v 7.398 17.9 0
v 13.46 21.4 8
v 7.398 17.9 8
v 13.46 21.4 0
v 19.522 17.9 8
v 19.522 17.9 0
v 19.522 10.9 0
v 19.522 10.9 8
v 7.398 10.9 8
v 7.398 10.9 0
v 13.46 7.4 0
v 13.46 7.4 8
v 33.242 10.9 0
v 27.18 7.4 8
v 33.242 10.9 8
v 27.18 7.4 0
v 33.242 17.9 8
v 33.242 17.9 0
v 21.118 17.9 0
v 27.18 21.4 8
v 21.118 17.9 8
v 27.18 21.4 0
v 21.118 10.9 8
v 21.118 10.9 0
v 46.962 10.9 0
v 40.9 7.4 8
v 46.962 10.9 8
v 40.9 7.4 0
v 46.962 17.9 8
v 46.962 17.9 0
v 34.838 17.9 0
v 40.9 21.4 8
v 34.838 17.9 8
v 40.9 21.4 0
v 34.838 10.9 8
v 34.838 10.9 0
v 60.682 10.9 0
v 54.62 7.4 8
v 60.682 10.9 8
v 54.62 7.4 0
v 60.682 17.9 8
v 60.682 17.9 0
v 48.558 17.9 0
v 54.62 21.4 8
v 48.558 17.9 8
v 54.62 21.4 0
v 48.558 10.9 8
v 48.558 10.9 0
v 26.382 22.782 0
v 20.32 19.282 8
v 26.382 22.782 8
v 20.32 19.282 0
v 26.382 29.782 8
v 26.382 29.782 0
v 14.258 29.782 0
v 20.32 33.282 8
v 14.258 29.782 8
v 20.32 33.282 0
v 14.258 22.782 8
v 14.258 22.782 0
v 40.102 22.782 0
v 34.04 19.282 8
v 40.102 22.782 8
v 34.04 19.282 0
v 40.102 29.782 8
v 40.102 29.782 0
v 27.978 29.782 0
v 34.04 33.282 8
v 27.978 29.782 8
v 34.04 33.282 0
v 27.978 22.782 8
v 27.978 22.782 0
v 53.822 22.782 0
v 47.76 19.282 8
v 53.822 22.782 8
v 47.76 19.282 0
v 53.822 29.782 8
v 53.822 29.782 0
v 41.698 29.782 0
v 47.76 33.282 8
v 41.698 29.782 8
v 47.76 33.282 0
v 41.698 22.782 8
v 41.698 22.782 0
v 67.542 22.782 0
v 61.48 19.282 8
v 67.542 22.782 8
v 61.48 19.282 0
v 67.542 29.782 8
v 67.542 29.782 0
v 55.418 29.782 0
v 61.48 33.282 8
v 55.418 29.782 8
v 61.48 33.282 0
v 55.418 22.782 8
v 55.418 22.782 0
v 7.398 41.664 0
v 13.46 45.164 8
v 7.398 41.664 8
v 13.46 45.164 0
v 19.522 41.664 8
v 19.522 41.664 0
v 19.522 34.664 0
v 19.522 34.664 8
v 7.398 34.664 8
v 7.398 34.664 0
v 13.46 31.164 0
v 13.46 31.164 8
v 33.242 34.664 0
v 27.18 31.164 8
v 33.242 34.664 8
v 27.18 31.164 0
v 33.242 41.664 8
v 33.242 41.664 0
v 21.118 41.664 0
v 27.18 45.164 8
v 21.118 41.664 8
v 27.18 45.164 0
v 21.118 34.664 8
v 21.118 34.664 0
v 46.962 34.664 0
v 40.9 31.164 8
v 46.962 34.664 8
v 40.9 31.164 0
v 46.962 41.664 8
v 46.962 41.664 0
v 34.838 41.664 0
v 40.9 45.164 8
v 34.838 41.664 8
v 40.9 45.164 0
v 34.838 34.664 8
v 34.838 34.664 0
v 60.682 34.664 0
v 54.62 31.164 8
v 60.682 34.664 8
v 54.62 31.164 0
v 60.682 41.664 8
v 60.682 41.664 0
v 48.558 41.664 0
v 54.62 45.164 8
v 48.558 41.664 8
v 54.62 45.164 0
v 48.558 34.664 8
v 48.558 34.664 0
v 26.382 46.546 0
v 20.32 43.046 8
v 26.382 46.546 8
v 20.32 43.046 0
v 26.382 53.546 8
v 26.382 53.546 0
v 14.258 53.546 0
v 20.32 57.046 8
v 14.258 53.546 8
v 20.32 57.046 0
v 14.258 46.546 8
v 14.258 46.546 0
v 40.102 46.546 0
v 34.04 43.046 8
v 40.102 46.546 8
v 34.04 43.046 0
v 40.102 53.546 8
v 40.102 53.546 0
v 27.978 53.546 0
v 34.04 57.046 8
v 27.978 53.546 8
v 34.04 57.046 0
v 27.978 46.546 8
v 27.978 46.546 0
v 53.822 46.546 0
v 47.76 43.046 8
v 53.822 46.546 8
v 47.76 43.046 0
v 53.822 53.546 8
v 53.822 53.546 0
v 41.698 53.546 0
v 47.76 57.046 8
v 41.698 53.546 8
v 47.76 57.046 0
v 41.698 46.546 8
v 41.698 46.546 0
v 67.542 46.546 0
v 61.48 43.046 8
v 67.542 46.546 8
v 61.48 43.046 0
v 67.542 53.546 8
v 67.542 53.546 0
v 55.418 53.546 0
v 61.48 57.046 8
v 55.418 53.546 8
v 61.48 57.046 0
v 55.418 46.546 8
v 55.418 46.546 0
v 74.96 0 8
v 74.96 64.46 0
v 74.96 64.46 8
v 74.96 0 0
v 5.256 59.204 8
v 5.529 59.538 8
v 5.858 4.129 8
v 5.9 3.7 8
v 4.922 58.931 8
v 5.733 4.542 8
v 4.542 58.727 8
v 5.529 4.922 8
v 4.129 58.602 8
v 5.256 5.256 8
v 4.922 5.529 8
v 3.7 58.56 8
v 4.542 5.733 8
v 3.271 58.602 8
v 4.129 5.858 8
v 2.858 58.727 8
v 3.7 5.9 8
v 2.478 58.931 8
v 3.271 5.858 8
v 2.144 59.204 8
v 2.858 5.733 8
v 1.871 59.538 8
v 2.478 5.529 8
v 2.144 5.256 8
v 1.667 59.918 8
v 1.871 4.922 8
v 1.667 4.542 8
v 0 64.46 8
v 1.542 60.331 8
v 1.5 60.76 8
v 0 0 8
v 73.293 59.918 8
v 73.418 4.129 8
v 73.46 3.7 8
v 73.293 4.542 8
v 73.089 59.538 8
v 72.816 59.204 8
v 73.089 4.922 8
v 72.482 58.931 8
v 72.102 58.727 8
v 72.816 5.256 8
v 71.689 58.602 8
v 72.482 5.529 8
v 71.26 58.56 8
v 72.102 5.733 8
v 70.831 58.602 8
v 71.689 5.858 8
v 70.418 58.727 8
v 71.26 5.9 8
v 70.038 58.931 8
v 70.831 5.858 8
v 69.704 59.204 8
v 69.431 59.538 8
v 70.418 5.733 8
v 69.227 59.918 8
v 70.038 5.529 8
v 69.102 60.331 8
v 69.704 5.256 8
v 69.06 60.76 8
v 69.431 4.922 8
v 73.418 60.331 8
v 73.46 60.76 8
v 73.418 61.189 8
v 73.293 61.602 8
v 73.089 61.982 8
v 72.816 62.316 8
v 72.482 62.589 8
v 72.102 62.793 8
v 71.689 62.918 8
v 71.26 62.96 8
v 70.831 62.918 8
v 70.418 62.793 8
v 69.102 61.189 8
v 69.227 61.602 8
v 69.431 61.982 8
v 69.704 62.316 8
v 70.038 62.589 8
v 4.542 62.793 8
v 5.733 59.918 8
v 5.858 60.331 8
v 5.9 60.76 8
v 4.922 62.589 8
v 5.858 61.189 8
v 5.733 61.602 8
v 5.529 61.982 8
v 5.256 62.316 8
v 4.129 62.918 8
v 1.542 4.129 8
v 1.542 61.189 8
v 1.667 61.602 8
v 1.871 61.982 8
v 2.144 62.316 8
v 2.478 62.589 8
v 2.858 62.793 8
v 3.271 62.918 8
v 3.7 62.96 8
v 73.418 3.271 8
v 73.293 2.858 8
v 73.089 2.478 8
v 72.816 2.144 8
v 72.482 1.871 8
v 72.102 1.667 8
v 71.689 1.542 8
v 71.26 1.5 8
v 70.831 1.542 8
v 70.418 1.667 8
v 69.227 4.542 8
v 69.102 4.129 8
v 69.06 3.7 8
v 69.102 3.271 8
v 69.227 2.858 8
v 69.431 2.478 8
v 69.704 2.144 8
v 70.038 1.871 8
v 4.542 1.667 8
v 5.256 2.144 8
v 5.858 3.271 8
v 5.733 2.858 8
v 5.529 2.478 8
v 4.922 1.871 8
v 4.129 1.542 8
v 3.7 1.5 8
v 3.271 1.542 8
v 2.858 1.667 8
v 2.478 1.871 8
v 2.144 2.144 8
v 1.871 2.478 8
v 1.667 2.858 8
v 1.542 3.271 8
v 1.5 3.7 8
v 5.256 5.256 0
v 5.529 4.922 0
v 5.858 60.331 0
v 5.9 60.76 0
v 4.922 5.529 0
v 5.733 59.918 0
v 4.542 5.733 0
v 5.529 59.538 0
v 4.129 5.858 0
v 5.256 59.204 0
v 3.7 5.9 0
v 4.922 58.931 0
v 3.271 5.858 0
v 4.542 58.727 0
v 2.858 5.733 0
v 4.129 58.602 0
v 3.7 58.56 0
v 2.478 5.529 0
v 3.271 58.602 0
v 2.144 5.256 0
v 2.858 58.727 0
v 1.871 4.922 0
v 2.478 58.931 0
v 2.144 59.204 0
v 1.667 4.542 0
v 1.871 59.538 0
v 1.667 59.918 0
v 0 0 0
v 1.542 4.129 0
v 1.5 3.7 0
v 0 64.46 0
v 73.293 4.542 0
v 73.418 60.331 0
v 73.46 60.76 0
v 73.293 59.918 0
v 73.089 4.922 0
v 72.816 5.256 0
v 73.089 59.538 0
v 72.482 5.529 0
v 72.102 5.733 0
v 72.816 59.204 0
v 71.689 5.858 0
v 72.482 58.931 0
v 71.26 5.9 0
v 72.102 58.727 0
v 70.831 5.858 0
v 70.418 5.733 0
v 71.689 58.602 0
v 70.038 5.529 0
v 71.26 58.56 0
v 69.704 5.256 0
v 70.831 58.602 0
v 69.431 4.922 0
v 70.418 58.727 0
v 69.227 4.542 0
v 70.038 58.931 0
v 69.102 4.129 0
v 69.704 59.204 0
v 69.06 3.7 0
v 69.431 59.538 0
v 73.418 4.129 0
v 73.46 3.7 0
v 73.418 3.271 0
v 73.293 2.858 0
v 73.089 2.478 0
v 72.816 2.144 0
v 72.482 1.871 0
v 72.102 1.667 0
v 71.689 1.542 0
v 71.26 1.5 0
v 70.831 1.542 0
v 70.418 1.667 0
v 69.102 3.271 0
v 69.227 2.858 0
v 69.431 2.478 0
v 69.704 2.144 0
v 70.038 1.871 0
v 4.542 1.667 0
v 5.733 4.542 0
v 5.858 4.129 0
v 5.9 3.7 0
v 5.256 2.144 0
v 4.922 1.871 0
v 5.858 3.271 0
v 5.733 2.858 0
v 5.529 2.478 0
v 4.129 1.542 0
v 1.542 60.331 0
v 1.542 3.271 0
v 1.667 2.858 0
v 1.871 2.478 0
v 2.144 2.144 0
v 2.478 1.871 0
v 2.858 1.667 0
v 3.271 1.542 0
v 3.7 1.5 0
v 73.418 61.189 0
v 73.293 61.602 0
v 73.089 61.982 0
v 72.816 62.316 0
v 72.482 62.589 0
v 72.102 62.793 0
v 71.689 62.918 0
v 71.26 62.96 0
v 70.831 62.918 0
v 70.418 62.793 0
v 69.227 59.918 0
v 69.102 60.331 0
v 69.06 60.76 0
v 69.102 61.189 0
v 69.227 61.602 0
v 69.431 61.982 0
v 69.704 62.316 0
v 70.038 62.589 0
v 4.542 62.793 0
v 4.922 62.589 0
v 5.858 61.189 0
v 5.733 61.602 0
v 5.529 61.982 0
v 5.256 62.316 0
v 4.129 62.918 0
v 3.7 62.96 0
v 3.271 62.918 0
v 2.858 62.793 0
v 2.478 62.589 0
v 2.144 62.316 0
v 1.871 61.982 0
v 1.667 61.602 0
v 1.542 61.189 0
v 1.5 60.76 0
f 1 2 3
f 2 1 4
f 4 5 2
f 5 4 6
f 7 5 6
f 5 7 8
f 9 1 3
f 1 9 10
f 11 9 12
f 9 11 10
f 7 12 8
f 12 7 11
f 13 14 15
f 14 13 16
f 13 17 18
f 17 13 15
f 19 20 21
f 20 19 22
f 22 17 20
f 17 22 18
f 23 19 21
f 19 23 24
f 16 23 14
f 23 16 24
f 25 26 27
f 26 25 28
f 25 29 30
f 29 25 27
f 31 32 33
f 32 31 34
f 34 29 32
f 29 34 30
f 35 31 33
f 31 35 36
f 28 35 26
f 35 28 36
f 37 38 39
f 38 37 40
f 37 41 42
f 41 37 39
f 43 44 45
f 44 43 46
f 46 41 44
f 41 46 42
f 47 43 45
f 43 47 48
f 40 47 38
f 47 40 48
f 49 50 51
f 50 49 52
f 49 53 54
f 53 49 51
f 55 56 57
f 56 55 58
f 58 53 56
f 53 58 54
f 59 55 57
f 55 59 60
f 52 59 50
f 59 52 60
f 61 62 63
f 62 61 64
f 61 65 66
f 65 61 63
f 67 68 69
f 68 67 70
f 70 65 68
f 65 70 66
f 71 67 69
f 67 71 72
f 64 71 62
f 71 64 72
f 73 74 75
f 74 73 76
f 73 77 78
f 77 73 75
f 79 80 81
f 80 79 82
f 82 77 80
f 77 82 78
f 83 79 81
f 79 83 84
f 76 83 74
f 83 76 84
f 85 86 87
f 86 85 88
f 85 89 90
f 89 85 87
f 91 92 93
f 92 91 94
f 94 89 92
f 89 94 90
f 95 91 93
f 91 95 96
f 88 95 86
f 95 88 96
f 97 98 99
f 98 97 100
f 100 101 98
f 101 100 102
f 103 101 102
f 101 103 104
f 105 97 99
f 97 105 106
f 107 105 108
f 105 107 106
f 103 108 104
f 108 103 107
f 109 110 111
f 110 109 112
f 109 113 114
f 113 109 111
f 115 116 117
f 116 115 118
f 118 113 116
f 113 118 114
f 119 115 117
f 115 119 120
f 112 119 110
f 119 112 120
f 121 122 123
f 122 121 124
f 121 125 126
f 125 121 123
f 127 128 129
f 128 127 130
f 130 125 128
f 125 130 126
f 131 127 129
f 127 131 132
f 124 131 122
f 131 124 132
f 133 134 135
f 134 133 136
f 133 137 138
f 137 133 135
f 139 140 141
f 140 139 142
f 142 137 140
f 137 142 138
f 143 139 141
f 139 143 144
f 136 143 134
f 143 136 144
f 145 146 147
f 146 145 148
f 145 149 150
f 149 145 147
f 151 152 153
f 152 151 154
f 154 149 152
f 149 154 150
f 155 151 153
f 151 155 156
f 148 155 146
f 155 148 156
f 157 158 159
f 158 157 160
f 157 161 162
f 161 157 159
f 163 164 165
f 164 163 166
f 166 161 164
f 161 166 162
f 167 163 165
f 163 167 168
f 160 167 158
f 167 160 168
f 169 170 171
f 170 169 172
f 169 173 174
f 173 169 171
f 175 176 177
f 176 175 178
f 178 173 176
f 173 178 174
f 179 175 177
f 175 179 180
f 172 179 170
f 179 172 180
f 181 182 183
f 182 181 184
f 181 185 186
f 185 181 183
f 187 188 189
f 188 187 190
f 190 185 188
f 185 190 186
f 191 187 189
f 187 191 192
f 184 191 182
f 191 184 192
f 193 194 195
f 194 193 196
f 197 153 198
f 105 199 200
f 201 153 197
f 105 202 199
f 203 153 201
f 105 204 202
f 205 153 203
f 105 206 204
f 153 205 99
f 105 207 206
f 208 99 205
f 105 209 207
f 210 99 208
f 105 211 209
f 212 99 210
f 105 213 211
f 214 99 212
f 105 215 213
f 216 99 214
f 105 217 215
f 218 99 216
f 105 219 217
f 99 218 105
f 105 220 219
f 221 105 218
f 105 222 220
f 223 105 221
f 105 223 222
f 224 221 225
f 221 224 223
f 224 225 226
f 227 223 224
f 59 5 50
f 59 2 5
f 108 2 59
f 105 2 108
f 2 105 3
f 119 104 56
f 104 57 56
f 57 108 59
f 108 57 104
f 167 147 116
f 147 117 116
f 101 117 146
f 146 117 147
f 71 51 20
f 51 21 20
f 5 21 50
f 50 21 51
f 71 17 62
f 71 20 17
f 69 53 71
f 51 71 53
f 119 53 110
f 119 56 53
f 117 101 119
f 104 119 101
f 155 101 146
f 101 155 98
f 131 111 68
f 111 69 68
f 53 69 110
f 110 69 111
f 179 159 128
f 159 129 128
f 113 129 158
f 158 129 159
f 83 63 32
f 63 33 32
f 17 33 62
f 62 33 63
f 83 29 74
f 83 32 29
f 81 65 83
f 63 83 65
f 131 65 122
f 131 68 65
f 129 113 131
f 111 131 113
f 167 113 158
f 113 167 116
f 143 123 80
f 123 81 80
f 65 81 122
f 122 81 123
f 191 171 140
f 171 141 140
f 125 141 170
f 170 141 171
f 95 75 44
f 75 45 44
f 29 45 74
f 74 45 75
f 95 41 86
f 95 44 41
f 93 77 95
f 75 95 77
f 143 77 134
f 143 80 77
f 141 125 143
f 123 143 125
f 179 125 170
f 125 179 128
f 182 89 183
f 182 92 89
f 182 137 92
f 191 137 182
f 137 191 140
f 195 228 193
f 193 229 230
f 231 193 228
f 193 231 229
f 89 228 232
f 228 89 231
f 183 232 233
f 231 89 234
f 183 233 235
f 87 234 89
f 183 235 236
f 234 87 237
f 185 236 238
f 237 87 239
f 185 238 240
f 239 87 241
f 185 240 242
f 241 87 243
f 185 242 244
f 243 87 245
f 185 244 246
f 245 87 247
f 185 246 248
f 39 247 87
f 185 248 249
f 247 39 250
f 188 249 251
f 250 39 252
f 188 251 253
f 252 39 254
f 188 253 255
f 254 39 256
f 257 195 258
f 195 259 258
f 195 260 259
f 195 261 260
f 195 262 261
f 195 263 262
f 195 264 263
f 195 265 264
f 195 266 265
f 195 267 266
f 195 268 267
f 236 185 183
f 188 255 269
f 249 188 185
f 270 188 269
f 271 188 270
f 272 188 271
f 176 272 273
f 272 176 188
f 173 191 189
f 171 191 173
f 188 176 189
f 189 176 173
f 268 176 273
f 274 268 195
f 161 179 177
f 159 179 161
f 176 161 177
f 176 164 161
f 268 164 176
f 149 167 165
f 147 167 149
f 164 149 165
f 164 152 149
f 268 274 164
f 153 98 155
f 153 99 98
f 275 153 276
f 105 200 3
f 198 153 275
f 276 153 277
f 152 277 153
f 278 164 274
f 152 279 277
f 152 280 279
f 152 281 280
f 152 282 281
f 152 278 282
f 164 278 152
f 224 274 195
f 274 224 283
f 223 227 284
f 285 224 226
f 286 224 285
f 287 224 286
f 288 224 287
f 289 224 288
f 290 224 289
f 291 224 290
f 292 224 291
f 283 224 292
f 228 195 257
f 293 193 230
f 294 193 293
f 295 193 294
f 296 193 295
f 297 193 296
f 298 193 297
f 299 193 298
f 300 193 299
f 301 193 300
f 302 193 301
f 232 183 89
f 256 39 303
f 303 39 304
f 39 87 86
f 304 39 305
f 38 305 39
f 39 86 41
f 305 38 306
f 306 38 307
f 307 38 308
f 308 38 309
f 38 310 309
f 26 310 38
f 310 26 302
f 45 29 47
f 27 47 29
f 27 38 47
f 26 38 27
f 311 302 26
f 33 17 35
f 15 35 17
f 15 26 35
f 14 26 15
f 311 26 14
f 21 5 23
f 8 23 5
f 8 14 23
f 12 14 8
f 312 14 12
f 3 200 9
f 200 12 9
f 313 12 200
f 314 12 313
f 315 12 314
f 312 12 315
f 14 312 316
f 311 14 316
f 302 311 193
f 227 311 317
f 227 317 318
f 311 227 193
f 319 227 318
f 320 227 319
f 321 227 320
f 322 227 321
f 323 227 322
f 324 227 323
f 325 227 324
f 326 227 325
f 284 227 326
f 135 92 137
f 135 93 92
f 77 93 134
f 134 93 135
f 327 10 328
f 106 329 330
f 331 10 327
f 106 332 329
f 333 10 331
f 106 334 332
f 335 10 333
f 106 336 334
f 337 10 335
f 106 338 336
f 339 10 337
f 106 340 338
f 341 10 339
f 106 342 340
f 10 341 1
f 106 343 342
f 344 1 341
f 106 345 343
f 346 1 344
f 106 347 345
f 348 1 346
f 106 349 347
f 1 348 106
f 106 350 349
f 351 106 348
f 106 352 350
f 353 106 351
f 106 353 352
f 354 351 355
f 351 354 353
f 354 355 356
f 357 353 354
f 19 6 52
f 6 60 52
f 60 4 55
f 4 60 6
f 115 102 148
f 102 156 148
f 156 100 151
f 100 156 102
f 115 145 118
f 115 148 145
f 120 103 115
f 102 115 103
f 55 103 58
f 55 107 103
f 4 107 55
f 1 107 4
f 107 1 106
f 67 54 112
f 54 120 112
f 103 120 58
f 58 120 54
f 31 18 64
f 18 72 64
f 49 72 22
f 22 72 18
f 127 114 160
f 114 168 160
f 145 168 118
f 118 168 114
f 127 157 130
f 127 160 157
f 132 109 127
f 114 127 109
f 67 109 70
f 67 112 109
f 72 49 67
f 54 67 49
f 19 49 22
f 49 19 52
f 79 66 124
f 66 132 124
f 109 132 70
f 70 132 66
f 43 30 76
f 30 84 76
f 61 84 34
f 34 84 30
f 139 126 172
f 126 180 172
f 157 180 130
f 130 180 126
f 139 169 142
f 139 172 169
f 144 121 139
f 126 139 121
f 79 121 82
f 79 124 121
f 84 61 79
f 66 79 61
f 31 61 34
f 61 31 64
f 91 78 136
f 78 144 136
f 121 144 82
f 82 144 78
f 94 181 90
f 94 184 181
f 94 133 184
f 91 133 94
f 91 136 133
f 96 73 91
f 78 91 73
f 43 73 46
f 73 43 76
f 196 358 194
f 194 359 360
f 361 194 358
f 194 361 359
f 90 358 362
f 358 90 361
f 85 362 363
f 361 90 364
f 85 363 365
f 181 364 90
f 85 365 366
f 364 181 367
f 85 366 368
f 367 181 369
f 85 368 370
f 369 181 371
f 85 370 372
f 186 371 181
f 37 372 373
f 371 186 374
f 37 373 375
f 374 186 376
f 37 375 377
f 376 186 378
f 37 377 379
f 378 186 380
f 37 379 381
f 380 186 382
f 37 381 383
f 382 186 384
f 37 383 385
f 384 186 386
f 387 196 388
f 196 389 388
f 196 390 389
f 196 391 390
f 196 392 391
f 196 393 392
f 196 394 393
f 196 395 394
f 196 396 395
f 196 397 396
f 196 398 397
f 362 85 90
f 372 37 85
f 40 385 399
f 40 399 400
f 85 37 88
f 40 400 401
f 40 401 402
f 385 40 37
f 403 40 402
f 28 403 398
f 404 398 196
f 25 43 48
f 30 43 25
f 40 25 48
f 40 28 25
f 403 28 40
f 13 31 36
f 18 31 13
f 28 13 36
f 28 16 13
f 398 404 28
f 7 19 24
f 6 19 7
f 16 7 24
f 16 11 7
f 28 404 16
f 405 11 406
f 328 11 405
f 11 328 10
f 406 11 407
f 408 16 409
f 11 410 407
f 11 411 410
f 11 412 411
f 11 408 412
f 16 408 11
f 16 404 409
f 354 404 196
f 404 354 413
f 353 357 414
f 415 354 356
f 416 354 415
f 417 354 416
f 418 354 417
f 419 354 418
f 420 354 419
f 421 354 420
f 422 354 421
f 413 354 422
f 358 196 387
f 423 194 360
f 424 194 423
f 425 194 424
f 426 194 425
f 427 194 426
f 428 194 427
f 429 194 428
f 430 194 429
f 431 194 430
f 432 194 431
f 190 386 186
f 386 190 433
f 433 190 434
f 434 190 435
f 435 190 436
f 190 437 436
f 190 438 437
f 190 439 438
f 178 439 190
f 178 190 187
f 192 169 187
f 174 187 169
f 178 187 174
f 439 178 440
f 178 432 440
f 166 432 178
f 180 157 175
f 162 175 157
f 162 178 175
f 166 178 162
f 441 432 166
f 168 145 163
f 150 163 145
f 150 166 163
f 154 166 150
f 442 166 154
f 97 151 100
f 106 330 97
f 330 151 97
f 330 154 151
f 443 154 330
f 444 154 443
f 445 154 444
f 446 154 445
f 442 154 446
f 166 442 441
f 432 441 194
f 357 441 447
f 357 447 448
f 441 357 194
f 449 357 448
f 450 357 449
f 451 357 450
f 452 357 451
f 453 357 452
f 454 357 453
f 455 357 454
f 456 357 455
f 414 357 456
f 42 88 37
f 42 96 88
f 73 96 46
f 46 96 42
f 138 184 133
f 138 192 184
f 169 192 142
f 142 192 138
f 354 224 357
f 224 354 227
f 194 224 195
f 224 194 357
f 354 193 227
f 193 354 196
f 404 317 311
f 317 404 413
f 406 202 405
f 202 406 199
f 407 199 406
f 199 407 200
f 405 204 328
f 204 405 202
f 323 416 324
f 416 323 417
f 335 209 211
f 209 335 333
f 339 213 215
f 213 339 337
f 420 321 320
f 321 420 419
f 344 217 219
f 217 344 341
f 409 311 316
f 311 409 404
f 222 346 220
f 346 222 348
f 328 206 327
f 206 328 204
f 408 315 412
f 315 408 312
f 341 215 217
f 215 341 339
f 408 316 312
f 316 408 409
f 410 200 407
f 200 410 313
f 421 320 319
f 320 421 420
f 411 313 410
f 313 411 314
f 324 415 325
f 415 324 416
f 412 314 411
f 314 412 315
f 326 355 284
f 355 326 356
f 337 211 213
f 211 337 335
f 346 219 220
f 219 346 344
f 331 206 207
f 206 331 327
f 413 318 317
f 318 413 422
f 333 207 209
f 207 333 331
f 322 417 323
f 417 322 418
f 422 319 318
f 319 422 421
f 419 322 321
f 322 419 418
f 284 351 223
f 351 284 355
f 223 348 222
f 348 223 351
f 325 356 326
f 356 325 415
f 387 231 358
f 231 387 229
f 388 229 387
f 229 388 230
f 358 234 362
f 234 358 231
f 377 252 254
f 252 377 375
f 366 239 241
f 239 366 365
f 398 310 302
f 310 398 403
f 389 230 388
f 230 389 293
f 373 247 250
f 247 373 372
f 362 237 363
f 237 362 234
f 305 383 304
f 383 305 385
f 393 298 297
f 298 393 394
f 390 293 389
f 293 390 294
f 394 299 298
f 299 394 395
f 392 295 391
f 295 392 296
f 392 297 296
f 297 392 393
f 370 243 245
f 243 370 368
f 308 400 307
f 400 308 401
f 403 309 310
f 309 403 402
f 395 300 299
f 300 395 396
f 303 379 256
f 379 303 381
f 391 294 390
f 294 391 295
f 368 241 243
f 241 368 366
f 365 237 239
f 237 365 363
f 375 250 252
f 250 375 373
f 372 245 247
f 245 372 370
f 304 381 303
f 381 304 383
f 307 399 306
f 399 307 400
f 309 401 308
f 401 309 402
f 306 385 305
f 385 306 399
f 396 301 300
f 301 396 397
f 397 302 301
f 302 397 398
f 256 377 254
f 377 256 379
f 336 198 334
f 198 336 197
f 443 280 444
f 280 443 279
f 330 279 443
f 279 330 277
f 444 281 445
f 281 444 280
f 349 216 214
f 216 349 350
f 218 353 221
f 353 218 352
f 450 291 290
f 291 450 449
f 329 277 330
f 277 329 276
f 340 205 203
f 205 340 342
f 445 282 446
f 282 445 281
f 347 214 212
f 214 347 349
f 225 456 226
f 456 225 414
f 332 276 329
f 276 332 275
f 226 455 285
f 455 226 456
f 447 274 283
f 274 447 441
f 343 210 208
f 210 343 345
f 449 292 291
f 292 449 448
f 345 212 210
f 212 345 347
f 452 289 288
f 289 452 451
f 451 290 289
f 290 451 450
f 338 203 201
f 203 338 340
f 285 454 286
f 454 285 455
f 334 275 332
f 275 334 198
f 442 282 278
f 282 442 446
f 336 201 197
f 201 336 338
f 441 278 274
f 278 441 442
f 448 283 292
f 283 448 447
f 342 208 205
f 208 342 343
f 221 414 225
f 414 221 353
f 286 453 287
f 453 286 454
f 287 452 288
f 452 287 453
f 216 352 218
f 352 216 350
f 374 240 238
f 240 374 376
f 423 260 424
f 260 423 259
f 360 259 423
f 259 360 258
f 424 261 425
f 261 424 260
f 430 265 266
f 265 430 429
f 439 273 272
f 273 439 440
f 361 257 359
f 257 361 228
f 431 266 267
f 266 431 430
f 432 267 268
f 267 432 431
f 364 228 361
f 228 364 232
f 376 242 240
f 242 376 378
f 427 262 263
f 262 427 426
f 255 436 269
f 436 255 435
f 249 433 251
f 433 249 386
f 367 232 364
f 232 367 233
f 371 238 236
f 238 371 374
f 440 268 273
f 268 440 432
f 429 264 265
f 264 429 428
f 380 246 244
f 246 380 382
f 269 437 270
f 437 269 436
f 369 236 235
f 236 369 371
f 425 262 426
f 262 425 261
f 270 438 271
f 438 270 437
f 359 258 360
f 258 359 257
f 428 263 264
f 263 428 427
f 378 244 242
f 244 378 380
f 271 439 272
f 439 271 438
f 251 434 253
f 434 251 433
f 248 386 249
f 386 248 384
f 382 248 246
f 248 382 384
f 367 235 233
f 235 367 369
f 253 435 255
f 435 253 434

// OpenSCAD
$fn = 32;

// ----------------------------------------------------------------------
// Honeycomb panel: 74.96 x 64.46 mm, 16 cells of 14 mm
// ----------------------------------------------------------------------

// --- parameters (mm) ---
panel_w = 74.96;          // panel width
panel_d = 64.46;          // panel depth
thick = 8;                // panel thickness
cell_r = 7;               // hex cell circumradius
pitch = 13.72;            // hex cell pitch (centre to centre)
web = 1.6;                // web between the cells
columns = 4;              // columns of cells
rows = 4;                 // rows of cells
cell_count = 16;          // total cells
shift_x = 13.46;          // first cell offset in x
shift_y = 14.4;           // first cell offset in y
mount_d = 4.4;            // corner mounting holes
hole_off = 3.7;           // mounting hole offset from the corners

difference() {
  union() {
    cube([panel_w, panel_d, thick]);
  }
  /* hexagonal cells, point-up, cut right through the plate */
  for (row = [0 : rows - 1]) {
    for (col = [0 : columns - 1]) {
      translate([shift_x + col * pitch + (row % 2) * pitch / 2, shift_y + row * pitch * 0.866025, -2.5]) rotate([0, 0, 30]) cylinder(h = thick + 5, d = 2 * cell_r, $fn = 6);
    }
  }
  /* corner mounting holes, clear of the outer cell web */
  translate([3.7, 3.7, -2.5]) cylinder(h = thick + 5, d = mount_d);
  translate([71.26, 3.7, -2.5]) cylinder(h = thick + 5, d = mount_d);
  translate([3.7, 60.76, -2.5]) cylinder(h = thick + 5, d = mount_d);
  translate([71.26, 60.76, -2.5]) cylinder(h = thick + 5, d = mount_d);
}
